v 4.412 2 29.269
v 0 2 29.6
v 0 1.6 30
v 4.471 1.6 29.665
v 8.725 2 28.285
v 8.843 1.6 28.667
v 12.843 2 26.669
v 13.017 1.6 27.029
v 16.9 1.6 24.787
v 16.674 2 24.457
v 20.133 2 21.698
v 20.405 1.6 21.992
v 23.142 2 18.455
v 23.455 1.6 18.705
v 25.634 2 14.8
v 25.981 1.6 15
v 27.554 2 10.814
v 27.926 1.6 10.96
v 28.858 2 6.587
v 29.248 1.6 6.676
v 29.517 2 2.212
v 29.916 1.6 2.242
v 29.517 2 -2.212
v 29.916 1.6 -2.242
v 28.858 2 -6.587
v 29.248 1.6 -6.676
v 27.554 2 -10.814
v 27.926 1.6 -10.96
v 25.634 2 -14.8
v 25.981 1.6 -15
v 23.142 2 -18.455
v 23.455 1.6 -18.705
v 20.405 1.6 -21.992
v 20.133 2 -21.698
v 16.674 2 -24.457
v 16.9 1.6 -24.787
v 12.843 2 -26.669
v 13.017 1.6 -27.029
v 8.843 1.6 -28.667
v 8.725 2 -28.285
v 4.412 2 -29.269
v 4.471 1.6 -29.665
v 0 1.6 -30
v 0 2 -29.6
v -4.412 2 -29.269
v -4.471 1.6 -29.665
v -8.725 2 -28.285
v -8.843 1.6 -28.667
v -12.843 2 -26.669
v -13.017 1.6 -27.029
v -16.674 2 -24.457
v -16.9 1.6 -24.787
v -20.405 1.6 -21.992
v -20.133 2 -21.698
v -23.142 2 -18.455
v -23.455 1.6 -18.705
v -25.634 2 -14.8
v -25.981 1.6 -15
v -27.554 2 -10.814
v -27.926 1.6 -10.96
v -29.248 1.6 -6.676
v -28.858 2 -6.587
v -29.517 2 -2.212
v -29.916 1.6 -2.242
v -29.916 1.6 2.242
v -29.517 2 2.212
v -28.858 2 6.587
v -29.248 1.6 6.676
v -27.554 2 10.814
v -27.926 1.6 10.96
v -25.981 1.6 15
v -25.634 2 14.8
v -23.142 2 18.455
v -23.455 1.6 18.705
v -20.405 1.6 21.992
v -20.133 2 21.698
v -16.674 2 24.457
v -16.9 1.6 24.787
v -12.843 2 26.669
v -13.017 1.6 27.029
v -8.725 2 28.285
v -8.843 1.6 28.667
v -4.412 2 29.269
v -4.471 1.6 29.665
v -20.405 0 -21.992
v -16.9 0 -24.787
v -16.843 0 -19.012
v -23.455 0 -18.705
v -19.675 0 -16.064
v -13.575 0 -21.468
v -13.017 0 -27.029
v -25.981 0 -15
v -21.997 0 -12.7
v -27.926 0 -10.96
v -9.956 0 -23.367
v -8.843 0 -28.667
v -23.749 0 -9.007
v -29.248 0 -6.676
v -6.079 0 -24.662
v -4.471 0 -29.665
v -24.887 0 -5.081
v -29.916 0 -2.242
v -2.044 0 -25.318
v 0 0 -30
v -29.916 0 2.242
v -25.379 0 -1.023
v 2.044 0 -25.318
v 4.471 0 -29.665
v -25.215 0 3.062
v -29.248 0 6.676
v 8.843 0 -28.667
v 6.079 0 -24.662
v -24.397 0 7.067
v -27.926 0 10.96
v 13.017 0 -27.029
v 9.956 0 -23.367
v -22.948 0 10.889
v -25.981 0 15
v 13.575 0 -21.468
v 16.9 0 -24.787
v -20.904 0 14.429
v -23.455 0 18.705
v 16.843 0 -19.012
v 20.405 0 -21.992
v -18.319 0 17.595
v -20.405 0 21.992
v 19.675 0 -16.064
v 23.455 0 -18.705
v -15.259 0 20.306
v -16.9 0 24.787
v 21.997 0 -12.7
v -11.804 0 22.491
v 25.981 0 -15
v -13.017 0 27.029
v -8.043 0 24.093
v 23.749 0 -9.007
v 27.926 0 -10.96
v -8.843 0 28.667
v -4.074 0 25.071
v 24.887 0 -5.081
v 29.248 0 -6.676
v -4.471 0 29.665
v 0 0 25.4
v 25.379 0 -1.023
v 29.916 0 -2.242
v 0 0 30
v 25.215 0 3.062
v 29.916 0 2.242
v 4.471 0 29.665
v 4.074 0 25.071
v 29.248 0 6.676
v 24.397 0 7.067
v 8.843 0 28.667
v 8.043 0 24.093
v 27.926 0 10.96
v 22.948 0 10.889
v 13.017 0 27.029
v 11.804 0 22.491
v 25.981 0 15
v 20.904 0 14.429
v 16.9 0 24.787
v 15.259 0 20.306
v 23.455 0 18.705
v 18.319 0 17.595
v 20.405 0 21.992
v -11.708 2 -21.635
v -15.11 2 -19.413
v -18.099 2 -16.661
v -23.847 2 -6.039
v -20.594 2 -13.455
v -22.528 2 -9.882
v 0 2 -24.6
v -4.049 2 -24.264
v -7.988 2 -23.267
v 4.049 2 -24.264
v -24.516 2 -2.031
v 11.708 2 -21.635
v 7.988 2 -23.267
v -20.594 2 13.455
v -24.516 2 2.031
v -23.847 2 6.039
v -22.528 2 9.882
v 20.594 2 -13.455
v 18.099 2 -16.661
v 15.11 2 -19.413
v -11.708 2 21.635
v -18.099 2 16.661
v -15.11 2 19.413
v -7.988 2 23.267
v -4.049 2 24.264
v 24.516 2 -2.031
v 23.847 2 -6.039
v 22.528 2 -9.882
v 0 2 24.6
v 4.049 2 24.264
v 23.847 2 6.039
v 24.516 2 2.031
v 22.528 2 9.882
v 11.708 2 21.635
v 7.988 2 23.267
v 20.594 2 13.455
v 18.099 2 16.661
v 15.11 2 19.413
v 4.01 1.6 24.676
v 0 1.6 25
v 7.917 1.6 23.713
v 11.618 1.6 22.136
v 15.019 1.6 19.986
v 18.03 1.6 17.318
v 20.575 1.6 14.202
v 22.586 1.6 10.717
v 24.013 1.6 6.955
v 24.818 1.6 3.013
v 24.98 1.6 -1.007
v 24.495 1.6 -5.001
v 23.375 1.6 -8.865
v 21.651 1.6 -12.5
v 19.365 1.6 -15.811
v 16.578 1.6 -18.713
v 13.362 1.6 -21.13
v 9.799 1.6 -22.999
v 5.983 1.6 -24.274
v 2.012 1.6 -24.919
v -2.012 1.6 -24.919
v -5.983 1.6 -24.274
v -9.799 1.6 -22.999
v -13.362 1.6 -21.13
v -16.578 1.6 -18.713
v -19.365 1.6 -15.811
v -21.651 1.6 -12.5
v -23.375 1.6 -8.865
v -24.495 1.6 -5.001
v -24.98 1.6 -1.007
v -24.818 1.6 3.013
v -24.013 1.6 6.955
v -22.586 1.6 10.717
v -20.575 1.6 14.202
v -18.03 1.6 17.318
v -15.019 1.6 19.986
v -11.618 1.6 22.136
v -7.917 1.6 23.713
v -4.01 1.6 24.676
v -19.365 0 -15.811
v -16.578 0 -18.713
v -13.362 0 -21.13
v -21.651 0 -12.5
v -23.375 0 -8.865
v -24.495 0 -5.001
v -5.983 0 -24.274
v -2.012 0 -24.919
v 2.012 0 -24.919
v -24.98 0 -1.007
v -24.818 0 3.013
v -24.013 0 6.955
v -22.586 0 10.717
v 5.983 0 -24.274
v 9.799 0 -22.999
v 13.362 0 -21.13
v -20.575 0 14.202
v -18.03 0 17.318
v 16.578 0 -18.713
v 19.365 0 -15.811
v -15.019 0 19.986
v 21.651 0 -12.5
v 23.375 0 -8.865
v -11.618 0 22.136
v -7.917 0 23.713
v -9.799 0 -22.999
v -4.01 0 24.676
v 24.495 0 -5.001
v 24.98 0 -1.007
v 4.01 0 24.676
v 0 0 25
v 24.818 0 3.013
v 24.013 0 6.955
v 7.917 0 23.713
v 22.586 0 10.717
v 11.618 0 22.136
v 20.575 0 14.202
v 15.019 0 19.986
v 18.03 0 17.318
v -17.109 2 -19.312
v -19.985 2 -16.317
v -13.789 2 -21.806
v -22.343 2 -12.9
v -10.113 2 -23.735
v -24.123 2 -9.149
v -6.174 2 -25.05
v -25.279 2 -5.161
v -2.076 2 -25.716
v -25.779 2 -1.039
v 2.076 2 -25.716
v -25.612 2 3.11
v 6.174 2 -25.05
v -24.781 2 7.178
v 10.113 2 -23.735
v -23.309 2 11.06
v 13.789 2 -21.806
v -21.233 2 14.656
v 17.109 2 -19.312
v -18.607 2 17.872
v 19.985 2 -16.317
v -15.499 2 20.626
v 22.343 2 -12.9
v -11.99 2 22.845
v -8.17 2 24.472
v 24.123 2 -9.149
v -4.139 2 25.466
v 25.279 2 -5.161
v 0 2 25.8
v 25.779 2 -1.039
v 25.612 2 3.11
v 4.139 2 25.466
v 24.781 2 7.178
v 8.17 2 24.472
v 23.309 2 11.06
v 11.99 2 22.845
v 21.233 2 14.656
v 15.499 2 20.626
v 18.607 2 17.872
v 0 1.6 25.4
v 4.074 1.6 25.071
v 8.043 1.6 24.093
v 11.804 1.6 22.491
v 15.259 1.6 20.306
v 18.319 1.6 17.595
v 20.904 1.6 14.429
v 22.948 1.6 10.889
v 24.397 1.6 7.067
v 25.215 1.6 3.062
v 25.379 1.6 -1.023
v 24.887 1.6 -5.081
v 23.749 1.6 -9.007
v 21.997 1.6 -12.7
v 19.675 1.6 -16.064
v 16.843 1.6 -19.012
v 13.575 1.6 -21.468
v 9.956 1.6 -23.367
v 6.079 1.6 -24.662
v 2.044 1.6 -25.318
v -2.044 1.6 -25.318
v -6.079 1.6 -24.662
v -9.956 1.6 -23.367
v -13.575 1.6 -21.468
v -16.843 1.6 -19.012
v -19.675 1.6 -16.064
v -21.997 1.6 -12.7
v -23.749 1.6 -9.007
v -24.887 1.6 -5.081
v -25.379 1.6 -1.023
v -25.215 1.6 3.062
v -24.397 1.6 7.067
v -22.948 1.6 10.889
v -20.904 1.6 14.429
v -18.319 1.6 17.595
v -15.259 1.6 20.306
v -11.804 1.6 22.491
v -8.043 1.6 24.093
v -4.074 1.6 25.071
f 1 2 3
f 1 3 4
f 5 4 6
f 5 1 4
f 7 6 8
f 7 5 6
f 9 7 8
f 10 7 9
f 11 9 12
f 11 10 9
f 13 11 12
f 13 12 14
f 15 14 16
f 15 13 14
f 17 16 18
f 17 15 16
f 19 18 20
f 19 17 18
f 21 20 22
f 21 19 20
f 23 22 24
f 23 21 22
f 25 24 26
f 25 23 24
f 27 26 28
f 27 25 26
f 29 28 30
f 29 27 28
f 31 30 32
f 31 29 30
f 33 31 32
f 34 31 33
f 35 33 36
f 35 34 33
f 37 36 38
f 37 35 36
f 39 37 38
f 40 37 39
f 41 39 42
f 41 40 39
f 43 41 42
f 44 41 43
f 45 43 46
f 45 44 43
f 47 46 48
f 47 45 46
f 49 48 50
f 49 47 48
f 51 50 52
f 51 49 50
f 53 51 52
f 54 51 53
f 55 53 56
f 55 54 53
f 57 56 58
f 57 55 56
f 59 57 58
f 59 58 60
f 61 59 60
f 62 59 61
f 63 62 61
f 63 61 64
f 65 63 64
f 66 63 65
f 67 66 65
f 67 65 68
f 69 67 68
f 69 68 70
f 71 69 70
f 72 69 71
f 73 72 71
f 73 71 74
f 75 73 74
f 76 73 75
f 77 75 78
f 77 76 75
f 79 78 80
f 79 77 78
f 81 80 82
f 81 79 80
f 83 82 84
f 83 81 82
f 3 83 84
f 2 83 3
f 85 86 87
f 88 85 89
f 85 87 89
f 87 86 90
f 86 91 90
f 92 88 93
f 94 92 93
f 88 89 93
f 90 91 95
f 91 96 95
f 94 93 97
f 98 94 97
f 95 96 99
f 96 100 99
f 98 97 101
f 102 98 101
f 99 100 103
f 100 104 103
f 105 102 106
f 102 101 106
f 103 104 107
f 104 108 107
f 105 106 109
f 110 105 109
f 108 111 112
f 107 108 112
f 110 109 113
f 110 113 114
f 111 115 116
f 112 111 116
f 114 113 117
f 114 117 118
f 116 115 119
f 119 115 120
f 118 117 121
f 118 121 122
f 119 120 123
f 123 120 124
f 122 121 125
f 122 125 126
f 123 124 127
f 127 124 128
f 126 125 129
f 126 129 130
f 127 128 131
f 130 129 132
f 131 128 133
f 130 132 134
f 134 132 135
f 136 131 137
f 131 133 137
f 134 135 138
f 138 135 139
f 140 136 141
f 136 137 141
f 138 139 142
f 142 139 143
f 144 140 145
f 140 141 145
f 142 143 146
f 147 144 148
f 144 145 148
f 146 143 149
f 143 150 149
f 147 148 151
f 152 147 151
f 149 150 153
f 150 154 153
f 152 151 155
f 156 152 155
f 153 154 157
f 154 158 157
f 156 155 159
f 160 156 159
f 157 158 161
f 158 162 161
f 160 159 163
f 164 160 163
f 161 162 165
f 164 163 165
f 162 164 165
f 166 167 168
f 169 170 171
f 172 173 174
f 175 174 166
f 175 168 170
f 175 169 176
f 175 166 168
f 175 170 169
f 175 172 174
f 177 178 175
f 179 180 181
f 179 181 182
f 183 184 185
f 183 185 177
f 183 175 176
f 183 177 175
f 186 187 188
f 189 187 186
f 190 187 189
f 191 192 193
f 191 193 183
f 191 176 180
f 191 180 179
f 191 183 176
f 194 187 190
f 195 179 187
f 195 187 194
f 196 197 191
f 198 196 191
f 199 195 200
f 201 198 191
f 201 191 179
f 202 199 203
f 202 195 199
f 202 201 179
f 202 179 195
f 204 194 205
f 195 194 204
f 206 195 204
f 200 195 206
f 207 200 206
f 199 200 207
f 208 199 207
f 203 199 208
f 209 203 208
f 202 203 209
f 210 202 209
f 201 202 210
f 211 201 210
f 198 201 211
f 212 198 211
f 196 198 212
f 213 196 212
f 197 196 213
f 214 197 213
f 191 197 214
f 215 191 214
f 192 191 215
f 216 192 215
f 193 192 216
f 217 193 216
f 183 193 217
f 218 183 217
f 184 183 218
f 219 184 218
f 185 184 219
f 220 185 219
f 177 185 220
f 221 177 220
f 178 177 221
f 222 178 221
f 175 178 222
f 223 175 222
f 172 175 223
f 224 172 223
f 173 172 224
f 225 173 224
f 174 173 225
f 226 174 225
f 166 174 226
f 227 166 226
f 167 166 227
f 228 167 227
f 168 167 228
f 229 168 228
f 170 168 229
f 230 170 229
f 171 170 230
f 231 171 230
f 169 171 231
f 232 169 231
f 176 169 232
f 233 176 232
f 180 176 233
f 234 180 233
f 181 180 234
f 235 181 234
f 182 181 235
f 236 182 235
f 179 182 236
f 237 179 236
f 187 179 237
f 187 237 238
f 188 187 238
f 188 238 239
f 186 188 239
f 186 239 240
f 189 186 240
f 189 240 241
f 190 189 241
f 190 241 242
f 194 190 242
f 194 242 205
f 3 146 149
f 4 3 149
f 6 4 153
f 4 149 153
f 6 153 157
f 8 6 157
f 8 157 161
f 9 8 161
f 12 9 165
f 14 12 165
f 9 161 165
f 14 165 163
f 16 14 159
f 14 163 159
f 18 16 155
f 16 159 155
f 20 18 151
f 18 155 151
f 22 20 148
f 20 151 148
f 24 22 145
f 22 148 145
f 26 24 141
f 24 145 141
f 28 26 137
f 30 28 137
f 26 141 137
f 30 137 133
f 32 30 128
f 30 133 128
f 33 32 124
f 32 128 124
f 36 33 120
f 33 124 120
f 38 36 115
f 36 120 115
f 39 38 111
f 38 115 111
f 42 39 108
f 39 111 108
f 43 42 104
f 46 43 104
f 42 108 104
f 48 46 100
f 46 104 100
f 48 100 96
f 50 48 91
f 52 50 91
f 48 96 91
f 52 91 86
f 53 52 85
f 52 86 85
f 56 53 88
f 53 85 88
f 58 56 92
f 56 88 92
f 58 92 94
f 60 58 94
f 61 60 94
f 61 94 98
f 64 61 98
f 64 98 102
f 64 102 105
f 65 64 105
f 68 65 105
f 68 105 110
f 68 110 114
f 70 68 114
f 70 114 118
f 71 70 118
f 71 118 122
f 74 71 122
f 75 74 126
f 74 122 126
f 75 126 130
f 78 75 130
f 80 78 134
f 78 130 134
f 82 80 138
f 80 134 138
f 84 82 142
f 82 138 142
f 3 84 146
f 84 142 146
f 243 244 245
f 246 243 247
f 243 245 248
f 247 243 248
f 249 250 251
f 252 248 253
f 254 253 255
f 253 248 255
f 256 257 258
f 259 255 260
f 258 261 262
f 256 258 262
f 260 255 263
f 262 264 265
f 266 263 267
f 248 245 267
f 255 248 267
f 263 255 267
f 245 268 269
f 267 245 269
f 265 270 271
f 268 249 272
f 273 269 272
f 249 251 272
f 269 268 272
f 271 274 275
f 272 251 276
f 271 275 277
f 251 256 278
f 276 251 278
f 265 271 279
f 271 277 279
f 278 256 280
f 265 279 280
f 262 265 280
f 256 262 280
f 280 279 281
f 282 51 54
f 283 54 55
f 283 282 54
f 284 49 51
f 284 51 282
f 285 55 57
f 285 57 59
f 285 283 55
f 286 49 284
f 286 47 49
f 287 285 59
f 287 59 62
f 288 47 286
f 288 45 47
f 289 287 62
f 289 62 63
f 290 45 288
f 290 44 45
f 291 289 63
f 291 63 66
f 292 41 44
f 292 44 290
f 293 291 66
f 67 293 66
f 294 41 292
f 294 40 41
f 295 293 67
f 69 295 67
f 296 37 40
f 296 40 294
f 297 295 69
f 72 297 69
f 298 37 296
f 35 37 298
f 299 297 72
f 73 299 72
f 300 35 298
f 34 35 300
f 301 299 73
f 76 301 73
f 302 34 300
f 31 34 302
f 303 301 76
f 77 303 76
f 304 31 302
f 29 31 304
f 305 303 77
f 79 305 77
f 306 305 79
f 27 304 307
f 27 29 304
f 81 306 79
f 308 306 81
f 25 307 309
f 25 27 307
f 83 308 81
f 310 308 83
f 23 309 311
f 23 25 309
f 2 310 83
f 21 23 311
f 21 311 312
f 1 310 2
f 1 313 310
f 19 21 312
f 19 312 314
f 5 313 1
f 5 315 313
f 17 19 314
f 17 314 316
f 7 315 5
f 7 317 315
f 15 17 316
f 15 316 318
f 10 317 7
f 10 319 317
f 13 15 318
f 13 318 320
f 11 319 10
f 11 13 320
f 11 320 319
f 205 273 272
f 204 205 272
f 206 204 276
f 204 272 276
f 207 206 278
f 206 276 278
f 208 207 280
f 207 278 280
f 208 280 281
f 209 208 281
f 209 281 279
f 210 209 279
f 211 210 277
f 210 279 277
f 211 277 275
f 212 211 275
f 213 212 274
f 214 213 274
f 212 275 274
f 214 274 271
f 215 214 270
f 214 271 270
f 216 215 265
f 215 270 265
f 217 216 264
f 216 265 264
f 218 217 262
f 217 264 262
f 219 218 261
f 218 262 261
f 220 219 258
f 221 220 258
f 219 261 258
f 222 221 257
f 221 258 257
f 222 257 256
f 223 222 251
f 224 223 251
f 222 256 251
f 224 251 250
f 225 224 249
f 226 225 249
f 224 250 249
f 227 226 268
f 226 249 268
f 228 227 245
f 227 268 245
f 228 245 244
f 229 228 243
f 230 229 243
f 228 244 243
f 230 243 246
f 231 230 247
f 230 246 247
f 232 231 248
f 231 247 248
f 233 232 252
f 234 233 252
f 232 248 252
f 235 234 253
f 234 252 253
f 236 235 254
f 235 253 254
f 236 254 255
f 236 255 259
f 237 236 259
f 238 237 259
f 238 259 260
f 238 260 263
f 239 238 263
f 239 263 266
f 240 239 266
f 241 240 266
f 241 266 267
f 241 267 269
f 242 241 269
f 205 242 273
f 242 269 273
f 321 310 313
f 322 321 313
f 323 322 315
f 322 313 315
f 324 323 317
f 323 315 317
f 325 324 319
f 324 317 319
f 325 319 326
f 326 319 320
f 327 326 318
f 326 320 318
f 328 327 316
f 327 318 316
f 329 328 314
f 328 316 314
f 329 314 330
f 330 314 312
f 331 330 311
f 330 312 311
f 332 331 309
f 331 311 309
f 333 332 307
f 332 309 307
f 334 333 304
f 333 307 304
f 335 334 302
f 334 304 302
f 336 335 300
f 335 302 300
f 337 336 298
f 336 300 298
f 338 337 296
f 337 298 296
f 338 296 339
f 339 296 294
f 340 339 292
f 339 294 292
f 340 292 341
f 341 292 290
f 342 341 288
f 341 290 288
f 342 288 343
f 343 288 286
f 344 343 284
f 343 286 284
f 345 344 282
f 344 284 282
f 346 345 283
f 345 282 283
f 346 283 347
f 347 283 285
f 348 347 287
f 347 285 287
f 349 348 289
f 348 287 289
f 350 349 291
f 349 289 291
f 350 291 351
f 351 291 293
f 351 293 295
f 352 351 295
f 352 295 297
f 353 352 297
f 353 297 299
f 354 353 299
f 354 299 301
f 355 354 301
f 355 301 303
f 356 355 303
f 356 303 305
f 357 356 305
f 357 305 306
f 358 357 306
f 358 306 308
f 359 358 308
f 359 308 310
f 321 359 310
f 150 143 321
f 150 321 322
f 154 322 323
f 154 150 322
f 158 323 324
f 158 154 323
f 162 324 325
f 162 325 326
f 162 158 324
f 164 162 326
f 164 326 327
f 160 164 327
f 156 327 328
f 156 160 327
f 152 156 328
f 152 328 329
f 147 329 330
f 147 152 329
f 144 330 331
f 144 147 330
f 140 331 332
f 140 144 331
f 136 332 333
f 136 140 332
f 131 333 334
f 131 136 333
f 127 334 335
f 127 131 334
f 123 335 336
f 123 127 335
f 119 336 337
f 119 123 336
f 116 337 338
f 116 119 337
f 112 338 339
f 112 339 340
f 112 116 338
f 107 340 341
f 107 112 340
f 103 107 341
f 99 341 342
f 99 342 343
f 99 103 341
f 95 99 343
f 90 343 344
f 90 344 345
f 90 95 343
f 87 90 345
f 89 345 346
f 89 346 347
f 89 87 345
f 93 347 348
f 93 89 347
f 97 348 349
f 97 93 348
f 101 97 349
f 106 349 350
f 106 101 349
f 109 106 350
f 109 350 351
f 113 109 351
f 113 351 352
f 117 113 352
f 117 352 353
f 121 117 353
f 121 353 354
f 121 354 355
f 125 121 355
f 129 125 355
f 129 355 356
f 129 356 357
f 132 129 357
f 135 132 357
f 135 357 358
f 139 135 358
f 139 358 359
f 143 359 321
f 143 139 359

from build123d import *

# Parameters (mm, degrees)
SKETCH_1_R        = 30
SKETCH_1_R_2      = 25.4
EXTRUDE_1_DEPTH   = 2
SKETCH_1_R_3      = 25
EXTRUDE_1_2_DEPTH = 2
CHAMFER_2_SIZE    = 0.4
CHAMFER_3_SIZE    = 0.4


with BuildPart() as part:
    # 草图1 → 凸台-拉伸1 (new body)
    with BuildSketch(Plane(origin=(0, 0, 0), x_dir=(1, 0, 0), z_dir=(0, 1, 0))):
        with Locations(Location((0, 0, 0), (0, 0, 270))):
            Circle(SKETCH_1_R)
        with Locations(Location((0, 0, 0), (0, 0, 270))):
            Circle(SKETCH_1_R_2, mode=Mode.SUBTRACT)
    extrude(amount=EXTRUDE_1_DEPTH)

    # 倒角2
    chamfer_2_edges = [part.edges().sort_by_distance(p)[0] for p in [
        (0, 2, -30),
        (0, 2, -25.4),
    ]]
    chamfer(chamfer_2_edges, length=CHAMFER_2_SIZE)


with BuildPart() as body_2:
    # 草图1 → Extrude 1 2 (new body)
    with BuildSketch(Plane(origin=(0, 0, 0), x_dir=(1, 0, 0), z_dir=(0, 1, 0))):
        with Locations(Location((0, 0, 0), (0, 0, 270))):
            Circle(SKETCH_1_R_3)
    extrude(amount=EXTRUDE_1_2_DEPTH)

    # 倒角3
    chamfer_3_edges = [body_2.edges().sort_by_distance(p)[0] for p in [
        (0, 2, -25),
    ]]
    chamfer(chamfer_3_edges, length=CHAMFER_3_SIZE)


solid = Compound([part.part, body_2.part])
